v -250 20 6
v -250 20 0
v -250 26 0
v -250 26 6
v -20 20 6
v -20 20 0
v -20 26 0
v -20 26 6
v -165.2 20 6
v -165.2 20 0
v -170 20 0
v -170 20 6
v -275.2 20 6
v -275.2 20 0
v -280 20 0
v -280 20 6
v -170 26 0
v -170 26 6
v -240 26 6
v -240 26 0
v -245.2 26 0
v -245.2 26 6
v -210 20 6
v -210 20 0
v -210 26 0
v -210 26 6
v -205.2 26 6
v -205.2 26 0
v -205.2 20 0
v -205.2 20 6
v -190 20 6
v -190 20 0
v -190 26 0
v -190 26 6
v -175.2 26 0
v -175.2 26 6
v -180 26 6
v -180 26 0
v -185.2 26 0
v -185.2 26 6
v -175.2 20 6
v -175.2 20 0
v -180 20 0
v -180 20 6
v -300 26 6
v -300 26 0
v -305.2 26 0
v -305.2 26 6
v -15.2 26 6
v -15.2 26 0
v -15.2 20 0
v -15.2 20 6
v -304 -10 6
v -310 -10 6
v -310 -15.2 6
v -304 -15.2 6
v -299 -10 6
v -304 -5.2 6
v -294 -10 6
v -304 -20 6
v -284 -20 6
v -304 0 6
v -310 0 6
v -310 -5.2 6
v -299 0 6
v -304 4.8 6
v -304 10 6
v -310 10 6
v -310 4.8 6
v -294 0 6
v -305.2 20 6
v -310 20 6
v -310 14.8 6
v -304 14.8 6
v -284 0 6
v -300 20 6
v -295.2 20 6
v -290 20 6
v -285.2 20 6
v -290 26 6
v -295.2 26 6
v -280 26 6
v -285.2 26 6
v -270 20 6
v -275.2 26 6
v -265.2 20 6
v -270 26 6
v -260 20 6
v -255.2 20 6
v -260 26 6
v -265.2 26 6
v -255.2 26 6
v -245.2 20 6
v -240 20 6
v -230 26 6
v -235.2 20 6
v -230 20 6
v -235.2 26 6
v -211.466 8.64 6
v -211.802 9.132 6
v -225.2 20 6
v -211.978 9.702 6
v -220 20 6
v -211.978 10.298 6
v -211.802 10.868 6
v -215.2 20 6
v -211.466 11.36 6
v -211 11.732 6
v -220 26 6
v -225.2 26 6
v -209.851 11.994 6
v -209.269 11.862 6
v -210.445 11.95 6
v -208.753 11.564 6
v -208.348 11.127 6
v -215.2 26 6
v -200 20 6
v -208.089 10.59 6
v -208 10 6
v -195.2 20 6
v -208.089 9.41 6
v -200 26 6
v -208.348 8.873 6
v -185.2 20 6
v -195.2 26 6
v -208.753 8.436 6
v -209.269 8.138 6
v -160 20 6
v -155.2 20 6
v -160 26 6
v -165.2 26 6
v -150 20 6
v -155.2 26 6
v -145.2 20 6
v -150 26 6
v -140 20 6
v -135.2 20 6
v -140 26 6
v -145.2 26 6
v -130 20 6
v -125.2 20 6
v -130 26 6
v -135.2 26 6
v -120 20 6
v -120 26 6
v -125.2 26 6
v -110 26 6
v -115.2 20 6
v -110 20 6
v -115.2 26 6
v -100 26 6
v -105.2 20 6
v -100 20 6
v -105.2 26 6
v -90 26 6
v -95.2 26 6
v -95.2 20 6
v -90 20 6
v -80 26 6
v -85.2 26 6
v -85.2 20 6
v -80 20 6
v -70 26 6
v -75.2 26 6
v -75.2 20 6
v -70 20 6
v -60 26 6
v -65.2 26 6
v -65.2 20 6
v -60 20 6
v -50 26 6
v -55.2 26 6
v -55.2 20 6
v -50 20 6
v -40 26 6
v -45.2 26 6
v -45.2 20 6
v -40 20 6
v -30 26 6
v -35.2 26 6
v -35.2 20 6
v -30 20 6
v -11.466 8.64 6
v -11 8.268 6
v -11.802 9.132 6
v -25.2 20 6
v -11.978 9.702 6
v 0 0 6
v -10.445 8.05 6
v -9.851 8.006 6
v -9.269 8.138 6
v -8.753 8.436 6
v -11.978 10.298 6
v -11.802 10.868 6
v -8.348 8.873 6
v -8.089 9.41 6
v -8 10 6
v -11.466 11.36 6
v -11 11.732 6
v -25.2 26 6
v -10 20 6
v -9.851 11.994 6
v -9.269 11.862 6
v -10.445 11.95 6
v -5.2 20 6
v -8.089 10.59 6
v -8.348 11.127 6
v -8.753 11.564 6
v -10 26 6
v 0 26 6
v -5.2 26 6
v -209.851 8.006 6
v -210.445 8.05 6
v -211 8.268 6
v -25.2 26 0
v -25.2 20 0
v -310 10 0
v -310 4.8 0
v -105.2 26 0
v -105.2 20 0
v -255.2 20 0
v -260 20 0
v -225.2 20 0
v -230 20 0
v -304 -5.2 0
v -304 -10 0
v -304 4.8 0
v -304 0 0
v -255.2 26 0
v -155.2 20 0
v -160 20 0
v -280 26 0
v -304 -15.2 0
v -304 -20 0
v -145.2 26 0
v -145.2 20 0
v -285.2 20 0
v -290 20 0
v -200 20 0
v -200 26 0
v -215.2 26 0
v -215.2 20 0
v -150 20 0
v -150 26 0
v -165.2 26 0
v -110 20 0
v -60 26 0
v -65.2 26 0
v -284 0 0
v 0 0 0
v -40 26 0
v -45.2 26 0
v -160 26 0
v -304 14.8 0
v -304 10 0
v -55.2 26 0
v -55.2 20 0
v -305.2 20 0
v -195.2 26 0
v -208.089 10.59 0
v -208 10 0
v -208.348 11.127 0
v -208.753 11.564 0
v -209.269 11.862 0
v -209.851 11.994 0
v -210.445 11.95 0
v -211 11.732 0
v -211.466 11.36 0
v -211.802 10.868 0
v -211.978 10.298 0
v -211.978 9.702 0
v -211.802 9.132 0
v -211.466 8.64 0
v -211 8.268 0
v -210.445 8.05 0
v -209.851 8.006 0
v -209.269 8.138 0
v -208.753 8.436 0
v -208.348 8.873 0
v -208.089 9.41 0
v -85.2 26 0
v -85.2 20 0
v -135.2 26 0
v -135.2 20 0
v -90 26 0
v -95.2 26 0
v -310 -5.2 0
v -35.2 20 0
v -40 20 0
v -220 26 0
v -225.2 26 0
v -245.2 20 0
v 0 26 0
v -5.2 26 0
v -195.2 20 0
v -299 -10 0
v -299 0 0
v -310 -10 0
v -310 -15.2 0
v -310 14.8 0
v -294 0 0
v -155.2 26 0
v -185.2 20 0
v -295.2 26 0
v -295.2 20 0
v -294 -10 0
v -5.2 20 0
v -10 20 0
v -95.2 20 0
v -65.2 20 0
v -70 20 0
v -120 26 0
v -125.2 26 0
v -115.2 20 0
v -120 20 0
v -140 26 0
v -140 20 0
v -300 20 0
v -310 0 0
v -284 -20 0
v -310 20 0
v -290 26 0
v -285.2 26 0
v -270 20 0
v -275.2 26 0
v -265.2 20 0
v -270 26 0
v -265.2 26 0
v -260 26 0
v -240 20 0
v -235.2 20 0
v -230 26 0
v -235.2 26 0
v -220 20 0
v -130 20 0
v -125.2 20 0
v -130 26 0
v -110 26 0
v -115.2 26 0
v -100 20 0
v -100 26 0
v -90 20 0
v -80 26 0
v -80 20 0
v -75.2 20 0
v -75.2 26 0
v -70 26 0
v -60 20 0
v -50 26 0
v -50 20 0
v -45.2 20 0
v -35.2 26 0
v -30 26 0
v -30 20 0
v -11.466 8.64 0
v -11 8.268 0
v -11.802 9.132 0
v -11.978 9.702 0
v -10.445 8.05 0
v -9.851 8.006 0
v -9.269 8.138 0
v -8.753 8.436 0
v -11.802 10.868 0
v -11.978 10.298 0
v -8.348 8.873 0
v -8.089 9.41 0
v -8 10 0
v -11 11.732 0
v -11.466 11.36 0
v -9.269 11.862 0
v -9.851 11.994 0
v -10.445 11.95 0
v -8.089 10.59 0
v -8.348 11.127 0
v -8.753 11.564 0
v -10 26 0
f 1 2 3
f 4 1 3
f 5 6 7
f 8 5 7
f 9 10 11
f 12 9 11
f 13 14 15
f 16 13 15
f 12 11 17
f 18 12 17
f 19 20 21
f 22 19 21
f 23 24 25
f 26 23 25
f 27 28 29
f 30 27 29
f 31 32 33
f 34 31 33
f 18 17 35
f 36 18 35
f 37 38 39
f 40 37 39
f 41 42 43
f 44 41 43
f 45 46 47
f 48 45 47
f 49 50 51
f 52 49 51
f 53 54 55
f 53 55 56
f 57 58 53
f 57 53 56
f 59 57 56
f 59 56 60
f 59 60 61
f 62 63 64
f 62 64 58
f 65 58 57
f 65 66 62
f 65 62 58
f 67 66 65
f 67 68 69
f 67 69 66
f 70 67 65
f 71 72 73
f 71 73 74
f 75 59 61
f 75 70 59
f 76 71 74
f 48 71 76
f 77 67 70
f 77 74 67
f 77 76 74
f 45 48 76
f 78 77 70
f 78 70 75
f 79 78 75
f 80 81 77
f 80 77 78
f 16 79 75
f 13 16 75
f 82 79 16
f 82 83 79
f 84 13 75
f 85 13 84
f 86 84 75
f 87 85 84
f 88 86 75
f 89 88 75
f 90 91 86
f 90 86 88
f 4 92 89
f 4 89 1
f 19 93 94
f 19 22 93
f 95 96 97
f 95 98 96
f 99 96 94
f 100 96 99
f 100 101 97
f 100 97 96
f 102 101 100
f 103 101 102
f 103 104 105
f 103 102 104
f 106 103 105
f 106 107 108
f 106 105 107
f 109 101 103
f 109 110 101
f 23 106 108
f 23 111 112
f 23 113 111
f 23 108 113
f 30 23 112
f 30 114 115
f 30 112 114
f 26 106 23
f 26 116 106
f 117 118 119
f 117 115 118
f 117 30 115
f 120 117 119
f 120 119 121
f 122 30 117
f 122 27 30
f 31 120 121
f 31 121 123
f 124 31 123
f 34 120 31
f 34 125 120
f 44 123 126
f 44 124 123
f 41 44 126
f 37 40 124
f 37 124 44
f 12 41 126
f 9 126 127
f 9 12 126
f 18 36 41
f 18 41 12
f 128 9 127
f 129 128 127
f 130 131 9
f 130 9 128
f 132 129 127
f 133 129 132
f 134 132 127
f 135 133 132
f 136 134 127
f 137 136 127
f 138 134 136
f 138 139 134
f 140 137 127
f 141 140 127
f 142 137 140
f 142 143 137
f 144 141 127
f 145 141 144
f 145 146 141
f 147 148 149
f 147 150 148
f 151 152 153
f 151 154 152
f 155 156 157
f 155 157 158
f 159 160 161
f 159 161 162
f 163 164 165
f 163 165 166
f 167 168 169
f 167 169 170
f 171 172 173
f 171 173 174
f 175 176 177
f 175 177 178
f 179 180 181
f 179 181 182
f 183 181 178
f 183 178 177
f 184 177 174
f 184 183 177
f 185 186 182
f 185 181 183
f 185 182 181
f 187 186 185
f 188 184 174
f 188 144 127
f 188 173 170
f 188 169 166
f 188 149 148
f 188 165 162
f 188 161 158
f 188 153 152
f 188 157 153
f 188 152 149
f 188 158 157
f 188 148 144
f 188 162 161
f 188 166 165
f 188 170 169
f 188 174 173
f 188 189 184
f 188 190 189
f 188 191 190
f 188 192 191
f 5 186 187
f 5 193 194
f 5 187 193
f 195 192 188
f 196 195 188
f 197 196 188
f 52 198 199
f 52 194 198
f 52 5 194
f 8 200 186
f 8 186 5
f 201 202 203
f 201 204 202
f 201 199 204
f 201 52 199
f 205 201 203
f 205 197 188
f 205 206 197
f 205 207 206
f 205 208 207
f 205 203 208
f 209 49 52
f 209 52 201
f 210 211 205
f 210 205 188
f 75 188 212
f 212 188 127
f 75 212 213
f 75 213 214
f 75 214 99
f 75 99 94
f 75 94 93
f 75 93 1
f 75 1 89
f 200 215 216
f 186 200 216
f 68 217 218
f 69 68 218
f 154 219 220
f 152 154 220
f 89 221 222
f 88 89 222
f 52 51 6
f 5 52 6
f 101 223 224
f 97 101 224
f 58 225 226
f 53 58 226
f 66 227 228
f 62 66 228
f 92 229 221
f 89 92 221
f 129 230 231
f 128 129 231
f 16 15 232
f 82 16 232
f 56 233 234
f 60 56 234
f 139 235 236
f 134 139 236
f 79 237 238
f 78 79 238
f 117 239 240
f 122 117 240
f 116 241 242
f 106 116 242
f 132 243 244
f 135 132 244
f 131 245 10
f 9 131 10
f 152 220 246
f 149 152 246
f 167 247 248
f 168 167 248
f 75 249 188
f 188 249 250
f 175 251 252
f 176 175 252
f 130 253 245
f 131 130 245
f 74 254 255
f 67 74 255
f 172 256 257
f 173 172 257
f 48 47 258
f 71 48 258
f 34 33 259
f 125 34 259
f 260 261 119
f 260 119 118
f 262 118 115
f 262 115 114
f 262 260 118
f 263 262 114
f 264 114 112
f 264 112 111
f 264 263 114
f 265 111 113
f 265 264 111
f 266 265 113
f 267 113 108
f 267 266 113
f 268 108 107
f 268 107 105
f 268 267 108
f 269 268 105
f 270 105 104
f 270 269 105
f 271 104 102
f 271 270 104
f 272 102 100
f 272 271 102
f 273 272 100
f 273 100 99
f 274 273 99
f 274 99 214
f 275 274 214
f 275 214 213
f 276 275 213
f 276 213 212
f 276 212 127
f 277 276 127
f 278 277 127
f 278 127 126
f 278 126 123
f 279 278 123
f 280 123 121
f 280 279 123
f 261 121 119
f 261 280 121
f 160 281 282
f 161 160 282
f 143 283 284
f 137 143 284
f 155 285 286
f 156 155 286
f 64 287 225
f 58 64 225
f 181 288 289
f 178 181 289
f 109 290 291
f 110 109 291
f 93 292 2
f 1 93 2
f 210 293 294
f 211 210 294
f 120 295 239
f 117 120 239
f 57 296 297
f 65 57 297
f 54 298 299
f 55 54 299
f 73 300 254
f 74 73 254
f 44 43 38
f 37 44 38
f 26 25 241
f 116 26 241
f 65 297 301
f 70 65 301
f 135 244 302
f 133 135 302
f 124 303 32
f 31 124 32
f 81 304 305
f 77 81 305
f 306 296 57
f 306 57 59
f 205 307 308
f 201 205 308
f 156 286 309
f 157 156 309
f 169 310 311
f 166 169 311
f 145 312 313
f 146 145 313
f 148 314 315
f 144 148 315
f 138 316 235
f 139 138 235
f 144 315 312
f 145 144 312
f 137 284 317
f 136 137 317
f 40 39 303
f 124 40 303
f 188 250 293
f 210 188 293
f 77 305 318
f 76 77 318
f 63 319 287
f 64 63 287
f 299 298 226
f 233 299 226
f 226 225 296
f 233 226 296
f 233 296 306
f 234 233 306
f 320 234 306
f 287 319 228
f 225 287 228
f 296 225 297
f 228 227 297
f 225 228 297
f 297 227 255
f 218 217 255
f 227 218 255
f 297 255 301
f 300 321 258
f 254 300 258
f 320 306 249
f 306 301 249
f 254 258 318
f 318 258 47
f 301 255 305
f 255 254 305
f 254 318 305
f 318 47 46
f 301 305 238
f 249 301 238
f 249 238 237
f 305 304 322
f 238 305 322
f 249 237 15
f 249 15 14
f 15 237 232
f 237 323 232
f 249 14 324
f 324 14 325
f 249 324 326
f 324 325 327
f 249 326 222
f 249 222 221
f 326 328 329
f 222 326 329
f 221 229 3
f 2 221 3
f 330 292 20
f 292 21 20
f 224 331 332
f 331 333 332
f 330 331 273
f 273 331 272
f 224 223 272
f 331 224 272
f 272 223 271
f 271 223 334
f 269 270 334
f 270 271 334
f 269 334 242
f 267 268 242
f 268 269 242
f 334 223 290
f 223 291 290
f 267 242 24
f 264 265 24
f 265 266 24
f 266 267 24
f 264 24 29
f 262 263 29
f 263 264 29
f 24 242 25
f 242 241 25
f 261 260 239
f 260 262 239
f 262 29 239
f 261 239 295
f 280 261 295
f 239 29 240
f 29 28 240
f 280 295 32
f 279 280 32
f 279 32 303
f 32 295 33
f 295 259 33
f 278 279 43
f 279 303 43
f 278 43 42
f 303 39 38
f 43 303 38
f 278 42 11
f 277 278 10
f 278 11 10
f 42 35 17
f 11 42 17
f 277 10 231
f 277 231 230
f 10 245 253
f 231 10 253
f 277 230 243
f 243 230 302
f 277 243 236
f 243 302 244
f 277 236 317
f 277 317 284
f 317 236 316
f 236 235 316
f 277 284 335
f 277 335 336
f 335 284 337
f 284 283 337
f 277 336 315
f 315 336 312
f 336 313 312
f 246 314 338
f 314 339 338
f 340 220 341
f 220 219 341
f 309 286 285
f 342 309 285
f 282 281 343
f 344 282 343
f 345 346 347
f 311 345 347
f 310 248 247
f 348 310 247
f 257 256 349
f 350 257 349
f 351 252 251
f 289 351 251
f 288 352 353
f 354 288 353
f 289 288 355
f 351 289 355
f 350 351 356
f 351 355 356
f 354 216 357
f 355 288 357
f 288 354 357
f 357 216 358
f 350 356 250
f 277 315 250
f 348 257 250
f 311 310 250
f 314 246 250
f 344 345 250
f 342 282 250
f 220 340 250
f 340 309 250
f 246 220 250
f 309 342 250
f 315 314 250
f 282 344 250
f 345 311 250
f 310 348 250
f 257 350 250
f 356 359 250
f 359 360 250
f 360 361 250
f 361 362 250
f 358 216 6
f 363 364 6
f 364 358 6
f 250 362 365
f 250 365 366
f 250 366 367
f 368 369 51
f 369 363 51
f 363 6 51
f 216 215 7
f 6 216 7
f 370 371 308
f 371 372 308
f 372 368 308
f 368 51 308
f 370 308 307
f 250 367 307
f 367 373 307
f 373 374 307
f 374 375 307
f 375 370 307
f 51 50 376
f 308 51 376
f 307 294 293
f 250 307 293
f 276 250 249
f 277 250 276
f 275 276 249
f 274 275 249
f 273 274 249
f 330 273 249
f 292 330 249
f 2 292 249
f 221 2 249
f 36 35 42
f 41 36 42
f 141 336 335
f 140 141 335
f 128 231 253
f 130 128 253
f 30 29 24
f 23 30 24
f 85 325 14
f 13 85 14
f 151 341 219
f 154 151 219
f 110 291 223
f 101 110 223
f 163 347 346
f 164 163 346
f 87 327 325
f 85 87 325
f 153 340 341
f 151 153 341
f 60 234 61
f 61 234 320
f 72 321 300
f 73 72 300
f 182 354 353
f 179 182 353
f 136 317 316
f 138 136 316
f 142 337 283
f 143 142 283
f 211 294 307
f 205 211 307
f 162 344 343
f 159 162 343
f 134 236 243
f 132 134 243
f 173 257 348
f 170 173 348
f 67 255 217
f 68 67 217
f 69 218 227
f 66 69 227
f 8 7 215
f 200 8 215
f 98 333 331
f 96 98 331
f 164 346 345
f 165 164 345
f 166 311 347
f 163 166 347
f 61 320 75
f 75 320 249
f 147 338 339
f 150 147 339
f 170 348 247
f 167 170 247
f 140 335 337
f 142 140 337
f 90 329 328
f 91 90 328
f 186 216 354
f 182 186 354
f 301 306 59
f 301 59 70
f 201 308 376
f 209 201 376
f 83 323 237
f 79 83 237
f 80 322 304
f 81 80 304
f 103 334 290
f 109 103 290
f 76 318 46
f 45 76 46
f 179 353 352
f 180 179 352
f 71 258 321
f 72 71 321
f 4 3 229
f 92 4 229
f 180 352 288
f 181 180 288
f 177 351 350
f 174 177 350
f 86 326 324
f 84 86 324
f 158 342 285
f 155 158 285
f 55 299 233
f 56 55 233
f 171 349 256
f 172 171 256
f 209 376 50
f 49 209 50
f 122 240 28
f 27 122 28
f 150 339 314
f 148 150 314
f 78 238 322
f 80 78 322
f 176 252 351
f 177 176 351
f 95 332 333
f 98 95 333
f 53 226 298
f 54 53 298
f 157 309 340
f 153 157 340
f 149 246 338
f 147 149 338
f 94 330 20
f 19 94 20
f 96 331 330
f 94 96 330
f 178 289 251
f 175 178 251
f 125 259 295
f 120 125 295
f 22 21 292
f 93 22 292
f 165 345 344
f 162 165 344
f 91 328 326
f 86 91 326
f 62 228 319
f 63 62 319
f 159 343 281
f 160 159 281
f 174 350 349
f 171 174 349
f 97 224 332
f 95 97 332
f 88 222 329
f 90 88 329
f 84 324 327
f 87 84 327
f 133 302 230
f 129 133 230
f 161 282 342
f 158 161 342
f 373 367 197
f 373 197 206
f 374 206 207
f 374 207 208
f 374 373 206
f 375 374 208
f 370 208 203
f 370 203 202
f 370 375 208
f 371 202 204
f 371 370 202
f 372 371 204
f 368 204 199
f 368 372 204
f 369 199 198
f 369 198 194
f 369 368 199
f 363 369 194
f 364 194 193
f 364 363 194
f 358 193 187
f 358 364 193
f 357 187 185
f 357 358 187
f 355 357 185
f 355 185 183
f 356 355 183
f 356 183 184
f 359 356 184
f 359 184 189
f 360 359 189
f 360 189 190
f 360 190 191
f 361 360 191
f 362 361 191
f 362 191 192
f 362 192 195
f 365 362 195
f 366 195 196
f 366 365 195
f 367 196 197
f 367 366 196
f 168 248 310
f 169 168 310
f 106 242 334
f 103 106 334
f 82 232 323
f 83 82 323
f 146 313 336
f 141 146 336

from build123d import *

# Parameters (mm, degrees)
ESQUISSE1_R        = 2
ESQUISSE1_W        = 5
ESQUISSE1_H        = 10
BOSS_EXTRU_1_DEPTH = 6


with BuildPart() as part:
    # Esquisse1 → Boss.-Extru.1 (new body)
    with BuildSketch(Plane.XY):
        Polygon((0, 0), (0, 26), (-5.2, 26), (-5.2, 20), (-10, 20), (-10, 26), (-15.2, 26), (-15.2, 20), (-20, 20), (-20, 26), (-25.2, 26), (-25.2, 20), (-30, 20), (-30, 26), (-35.2, 26), (-35.2, 20), (-40, 20), (-40, 26), (-45.2, 26), (-45.2, 20), (-50, 20), (-50, 26), (-55.2, 26), (-55.2, 20), (-60, 20), (-60, 26), (-65.2, 26), (-65.2, 20), (-70, 20), (-70, 26), (-75.2, 26), (-75.2, 20), (-80, 20), (-80, 26), (-85.2, 26), (-85.2, 20), (-90, 20), (-90, 26), (-95.2, 26), (-95.2, 20), (-100, 20), (-100, 26), (-105.2, 26), (-105.2, 20), (-110, 20), (-110, 26), (-115.2, 26), (-115.2, 20), (-120, 20), (-120, 26), (-125.2, 26), (-125.2, 20), (-130, 20), (-130, 26), (-135.2, 26), (-135.2, 20), (-140, 20), (-140, 26), (-145.2, 26), (-145.2, 20), (-150, 20), (-150, 26), (-155.2, 26), (-155.2, 20), (-160, 20), (-160, 26), (-165.2, 26), (-165.2, 20), (-170, 20), (-170, 26), (-175.2, 26), (-175.2, 20), (-180, 20), (-180, 26), (-185.2, 26), (-185.2, 20), (-190, 20), (-190, 26), (-195.2, 26), (-195.2, 20), (-200, 20), (-200, 26), (-205.2, 26), (-205.2, 20), (-210, 20), (-210, 26), (-215.2, 26), (-215.2, 20), (-220, 20), (-220, 26), (-225.2, 26), (-225.2, 20), (-230, 20), (-230, 26), (-235.2, 26), (-235.2, 20), (-240, 20), (-240, 26), (-245.2, 26), (-245.2, 20), (-250, 20), (-250, 26), (-255.2, 26), (-255.2, 20), (-260, 20), (-260, 26), (-265.2, 26), (-265.2, 20), (-270, 20), (-270, 26), (-275.2, 26), (-275.2, 20), (-280, 20), (-280, 26), (-285.2, 26), (-285.2, 20), (-290, 20), (-290, 26), (-295.2, 26), (-295.2, 20), (-300, 20), (-300, 26), (-305.2, 26), (-305.2, 20), (-310, 20), (-310, 14.8), (-304, 14.8), (-304, 10), (-310, 10), (-310, 4.8), (-304, 4.8), (-304, 0), (-310, 0), (-310, -5.2), (-304, -5.2), (-304, -10), (-310, -10), (-310, -15.2), (-304, -15.2), (-304, -20), (-284, -20), (-284, 0), align=None)
        with Locations((-210, 10)):
            Circle(ESQUISSE1_R, mode=Mode.SUBTRACT)
        with Locations((-10, 10)):
            Circle(ESQUISSE1_R, mode=Mode.SUBTRACT)
        with Locations((-296.5, -5)):
            Rectangle(ESQUISSE1_W, ESQUISSE1_H, mode=Mode.SUBTRACT)
    extrude(amount=BOSS_EXTRU_1_DEPTH)


solid = part.part
